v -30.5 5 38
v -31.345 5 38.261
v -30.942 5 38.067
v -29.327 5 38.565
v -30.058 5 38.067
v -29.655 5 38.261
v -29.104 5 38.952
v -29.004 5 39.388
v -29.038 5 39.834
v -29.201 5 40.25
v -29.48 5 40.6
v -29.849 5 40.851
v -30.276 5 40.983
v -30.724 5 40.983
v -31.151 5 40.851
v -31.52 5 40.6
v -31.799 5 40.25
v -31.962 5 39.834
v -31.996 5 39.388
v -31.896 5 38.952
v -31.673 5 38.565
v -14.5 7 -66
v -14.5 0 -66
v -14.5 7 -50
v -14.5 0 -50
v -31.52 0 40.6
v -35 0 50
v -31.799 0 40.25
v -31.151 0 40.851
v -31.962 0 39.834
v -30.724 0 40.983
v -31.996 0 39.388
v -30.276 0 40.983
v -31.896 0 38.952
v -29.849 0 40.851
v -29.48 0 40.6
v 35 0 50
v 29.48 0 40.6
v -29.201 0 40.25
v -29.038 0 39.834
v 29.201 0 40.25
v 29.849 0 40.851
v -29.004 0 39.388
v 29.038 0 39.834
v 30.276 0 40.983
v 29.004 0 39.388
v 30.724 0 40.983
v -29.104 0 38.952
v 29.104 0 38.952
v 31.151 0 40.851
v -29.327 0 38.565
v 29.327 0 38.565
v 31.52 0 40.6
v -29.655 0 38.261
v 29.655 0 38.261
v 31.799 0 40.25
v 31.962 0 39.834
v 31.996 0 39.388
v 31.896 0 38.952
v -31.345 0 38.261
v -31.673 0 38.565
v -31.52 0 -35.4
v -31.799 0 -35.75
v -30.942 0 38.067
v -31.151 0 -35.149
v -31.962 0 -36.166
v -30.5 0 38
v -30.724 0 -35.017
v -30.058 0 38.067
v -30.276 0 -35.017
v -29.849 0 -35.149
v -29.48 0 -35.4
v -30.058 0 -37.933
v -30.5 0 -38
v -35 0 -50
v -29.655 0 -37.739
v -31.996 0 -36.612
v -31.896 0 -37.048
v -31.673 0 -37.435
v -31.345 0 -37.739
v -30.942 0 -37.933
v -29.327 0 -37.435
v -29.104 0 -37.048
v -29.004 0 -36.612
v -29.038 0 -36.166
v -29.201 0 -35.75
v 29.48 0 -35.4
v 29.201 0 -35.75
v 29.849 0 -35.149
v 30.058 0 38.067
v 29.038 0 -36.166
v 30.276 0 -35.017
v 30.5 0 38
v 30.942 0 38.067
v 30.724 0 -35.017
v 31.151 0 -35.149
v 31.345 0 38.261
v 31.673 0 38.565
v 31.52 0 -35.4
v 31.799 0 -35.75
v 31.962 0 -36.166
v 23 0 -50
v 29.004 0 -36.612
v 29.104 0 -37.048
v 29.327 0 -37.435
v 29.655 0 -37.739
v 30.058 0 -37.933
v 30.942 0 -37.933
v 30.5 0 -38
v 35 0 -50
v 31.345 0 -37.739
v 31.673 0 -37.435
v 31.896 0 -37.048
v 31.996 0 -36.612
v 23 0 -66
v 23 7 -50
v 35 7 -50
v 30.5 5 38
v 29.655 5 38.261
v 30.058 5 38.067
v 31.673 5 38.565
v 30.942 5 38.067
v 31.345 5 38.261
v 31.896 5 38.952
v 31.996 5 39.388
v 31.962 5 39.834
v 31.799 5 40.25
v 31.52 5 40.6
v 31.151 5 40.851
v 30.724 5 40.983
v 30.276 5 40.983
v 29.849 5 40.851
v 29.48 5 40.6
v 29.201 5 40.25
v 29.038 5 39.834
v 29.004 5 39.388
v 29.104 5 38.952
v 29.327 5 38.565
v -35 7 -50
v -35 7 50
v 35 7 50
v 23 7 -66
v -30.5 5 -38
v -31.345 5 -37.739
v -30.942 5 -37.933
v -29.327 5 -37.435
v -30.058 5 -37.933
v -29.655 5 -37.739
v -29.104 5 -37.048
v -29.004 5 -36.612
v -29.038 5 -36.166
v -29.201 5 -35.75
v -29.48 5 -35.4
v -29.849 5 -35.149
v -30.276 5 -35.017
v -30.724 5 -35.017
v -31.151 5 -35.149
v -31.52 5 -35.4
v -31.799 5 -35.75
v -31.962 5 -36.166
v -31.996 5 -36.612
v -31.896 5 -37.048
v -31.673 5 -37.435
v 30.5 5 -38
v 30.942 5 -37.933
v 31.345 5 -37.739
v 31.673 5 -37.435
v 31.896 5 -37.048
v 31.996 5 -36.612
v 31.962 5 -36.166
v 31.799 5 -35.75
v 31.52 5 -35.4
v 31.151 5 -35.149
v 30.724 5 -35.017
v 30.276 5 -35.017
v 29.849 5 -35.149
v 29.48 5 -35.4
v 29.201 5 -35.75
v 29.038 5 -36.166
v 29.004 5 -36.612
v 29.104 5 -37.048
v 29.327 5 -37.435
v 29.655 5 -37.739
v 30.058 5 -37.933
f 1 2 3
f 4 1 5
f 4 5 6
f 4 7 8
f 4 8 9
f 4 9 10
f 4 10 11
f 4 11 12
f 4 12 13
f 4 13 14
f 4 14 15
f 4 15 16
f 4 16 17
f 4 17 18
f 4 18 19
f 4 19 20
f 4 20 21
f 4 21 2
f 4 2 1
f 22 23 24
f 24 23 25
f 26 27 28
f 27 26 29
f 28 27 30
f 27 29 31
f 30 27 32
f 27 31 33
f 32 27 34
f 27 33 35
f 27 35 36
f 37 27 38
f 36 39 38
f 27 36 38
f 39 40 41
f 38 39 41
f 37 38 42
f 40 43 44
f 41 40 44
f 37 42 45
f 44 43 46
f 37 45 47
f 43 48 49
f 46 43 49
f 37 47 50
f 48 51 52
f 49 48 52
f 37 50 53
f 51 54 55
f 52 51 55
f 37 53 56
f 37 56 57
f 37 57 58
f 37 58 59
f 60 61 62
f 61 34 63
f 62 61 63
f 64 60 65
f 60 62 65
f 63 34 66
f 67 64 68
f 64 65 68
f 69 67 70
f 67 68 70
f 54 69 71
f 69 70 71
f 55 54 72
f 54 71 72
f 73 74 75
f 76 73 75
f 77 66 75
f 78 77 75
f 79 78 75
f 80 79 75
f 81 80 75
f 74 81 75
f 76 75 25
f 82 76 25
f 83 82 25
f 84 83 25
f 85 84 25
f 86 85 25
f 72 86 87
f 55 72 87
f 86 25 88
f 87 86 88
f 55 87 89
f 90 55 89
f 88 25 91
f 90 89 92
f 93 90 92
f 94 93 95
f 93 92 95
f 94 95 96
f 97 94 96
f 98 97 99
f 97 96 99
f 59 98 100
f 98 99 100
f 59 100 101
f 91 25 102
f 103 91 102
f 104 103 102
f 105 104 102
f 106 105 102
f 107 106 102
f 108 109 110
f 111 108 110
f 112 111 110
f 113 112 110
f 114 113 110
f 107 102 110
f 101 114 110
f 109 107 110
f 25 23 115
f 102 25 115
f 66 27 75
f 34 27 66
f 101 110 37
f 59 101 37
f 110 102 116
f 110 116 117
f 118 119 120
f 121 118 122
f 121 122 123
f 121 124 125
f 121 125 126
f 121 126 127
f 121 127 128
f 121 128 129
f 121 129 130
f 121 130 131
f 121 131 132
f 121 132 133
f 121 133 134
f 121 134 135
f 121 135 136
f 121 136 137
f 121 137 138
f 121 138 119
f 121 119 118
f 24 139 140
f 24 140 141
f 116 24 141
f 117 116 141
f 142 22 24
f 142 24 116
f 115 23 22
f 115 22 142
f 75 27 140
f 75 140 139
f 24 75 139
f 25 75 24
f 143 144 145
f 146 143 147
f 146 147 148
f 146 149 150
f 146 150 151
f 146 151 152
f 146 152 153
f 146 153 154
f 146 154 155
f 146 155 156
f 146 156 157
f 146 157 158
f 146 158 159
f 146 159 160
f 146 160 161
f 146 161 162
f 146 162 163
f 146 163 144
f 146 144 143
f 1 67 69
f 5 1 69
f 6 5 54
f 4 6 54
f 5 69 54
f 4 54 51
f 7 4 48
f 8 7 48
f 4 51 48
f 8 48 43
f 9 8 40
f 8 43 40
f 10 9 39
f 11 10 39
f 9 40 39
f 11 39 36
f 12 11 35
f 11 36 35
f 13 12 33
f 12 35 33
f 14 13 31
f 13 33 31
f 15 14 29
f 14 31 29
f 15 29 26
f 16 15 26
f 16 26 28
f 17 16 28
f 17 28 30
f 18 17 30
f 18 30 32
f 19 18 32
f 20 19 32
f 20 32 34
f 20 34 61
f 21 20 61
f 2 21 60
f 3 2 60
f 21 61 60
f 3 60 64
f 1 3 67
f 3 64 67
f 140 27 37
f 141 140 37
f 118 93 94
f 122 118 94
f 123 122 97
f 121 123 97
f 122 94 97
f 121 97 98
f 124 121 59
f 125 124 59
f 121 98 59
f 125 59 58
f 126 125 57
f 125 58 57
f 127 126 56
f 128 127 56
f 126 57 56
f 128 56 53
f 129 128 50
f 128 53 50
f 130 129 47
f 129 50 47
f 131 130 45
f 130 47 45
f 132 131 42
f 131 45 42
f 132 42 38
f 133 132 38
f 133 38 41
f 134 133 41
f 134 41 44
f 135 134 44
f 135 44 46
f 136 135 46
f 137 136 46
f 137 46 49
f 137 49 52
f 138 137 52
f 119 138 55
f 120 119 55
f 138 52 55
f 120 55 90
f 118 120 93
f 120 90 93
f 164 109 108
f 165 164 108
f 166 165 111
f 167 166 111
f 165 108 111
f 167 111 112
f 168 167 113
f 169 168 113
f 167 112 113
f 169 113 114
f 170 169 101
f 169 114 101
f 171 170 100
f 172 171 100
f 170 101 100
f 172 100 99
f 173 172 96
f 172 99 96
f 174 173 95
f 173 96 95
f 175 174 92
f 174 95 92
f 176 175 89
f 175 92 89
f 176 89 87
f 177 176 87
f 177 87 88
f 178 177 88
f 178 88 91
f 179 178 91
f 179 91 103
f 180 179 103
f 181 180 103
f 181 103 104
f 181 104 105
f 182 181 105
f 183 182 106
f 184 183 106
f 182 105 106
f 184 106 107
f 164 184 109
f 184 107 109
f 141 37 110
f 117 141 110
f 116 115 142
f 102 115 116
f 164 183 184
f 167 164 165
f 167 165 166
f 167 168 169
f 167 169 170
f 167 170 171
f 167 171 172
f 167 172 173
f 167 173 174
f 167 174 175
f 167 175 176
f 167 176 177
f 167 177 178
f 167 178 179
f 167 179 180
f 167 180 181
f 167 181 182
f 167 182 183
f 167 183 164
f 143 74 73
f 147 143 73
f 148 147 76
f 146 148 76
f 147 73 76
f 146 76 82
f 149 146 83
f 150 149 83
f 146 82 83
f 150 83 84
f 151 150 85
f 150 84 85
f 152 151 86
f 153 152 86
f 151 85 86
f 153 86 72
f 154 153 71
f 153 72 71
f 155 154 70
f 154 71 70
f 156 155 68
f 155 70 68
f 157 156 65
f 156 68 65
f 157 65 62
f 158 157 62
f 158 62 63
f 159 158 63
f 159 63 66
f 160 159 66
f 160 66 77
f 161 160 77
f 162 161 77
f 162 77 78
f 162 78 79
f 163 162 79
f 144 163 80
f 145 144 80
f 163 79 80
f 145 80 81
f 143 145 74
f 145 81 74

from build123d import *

# Parameters (mm, degrees)
SKETCH1_W           = 70
SKETCH1_H           = 100
BOSS_EXTRUDE1_DEPTH = 7
SKETCH2_R           = 1.5
CUT_EXTRUDE1_DEPTH  = 5
SKETCH3_W           = 37.5
SKETCH3_H           = 16
BOSS_EXTRUDE2_DEPTH = 7


with BuildPart() as part:
    # Sketch1 → Boss-Extrude1 (new body)
    with BuildSketch(Plane(origin=(0, 0, 0), x_dir=(1, 0, 0), z_dir=(0, 1, 0))):
        Rectangle(SKETCH1_W, SKETCH1_H)
    extrude(amount=BOSS_EXTRUDE1_DEPTH)

    # Sketch2 → Cut-Extrude1 (cut)
    with BuildSketch(Plane.XZ):
        with Locations(Location((-30.5, -36.5, 0), (0, 0, 270))):
            Circle(SKETCH2_R)
        with Locations(Location((-30.5, 39.5, 0), (0, 0, 270))):
            Circle(SKETCH2_R)
        with Locations(Location((30.5, 39.5, 0), (0, 0, 270))):
            Circle(SKETCH2_R)
        with Locations(Location((30.5, -36.5, 0), (0, 0, 270))):
            Circle(SKETCH2_R)
    extrude(amount=-CUT_EXTRUDE1_DEPTH, mode=Mode.SUBTRACT)

    # Sketch3 → Boss-Extrude2 (add)
    with BuildSketch(Plane.XZ):
        with Locations((4.25, -58)):
            Rectangle(SKETCH3_W, SKETCH3_H)
    extrude(amount=-BOSS_EXTRUDE2_DEPTH)


solid = part.part
